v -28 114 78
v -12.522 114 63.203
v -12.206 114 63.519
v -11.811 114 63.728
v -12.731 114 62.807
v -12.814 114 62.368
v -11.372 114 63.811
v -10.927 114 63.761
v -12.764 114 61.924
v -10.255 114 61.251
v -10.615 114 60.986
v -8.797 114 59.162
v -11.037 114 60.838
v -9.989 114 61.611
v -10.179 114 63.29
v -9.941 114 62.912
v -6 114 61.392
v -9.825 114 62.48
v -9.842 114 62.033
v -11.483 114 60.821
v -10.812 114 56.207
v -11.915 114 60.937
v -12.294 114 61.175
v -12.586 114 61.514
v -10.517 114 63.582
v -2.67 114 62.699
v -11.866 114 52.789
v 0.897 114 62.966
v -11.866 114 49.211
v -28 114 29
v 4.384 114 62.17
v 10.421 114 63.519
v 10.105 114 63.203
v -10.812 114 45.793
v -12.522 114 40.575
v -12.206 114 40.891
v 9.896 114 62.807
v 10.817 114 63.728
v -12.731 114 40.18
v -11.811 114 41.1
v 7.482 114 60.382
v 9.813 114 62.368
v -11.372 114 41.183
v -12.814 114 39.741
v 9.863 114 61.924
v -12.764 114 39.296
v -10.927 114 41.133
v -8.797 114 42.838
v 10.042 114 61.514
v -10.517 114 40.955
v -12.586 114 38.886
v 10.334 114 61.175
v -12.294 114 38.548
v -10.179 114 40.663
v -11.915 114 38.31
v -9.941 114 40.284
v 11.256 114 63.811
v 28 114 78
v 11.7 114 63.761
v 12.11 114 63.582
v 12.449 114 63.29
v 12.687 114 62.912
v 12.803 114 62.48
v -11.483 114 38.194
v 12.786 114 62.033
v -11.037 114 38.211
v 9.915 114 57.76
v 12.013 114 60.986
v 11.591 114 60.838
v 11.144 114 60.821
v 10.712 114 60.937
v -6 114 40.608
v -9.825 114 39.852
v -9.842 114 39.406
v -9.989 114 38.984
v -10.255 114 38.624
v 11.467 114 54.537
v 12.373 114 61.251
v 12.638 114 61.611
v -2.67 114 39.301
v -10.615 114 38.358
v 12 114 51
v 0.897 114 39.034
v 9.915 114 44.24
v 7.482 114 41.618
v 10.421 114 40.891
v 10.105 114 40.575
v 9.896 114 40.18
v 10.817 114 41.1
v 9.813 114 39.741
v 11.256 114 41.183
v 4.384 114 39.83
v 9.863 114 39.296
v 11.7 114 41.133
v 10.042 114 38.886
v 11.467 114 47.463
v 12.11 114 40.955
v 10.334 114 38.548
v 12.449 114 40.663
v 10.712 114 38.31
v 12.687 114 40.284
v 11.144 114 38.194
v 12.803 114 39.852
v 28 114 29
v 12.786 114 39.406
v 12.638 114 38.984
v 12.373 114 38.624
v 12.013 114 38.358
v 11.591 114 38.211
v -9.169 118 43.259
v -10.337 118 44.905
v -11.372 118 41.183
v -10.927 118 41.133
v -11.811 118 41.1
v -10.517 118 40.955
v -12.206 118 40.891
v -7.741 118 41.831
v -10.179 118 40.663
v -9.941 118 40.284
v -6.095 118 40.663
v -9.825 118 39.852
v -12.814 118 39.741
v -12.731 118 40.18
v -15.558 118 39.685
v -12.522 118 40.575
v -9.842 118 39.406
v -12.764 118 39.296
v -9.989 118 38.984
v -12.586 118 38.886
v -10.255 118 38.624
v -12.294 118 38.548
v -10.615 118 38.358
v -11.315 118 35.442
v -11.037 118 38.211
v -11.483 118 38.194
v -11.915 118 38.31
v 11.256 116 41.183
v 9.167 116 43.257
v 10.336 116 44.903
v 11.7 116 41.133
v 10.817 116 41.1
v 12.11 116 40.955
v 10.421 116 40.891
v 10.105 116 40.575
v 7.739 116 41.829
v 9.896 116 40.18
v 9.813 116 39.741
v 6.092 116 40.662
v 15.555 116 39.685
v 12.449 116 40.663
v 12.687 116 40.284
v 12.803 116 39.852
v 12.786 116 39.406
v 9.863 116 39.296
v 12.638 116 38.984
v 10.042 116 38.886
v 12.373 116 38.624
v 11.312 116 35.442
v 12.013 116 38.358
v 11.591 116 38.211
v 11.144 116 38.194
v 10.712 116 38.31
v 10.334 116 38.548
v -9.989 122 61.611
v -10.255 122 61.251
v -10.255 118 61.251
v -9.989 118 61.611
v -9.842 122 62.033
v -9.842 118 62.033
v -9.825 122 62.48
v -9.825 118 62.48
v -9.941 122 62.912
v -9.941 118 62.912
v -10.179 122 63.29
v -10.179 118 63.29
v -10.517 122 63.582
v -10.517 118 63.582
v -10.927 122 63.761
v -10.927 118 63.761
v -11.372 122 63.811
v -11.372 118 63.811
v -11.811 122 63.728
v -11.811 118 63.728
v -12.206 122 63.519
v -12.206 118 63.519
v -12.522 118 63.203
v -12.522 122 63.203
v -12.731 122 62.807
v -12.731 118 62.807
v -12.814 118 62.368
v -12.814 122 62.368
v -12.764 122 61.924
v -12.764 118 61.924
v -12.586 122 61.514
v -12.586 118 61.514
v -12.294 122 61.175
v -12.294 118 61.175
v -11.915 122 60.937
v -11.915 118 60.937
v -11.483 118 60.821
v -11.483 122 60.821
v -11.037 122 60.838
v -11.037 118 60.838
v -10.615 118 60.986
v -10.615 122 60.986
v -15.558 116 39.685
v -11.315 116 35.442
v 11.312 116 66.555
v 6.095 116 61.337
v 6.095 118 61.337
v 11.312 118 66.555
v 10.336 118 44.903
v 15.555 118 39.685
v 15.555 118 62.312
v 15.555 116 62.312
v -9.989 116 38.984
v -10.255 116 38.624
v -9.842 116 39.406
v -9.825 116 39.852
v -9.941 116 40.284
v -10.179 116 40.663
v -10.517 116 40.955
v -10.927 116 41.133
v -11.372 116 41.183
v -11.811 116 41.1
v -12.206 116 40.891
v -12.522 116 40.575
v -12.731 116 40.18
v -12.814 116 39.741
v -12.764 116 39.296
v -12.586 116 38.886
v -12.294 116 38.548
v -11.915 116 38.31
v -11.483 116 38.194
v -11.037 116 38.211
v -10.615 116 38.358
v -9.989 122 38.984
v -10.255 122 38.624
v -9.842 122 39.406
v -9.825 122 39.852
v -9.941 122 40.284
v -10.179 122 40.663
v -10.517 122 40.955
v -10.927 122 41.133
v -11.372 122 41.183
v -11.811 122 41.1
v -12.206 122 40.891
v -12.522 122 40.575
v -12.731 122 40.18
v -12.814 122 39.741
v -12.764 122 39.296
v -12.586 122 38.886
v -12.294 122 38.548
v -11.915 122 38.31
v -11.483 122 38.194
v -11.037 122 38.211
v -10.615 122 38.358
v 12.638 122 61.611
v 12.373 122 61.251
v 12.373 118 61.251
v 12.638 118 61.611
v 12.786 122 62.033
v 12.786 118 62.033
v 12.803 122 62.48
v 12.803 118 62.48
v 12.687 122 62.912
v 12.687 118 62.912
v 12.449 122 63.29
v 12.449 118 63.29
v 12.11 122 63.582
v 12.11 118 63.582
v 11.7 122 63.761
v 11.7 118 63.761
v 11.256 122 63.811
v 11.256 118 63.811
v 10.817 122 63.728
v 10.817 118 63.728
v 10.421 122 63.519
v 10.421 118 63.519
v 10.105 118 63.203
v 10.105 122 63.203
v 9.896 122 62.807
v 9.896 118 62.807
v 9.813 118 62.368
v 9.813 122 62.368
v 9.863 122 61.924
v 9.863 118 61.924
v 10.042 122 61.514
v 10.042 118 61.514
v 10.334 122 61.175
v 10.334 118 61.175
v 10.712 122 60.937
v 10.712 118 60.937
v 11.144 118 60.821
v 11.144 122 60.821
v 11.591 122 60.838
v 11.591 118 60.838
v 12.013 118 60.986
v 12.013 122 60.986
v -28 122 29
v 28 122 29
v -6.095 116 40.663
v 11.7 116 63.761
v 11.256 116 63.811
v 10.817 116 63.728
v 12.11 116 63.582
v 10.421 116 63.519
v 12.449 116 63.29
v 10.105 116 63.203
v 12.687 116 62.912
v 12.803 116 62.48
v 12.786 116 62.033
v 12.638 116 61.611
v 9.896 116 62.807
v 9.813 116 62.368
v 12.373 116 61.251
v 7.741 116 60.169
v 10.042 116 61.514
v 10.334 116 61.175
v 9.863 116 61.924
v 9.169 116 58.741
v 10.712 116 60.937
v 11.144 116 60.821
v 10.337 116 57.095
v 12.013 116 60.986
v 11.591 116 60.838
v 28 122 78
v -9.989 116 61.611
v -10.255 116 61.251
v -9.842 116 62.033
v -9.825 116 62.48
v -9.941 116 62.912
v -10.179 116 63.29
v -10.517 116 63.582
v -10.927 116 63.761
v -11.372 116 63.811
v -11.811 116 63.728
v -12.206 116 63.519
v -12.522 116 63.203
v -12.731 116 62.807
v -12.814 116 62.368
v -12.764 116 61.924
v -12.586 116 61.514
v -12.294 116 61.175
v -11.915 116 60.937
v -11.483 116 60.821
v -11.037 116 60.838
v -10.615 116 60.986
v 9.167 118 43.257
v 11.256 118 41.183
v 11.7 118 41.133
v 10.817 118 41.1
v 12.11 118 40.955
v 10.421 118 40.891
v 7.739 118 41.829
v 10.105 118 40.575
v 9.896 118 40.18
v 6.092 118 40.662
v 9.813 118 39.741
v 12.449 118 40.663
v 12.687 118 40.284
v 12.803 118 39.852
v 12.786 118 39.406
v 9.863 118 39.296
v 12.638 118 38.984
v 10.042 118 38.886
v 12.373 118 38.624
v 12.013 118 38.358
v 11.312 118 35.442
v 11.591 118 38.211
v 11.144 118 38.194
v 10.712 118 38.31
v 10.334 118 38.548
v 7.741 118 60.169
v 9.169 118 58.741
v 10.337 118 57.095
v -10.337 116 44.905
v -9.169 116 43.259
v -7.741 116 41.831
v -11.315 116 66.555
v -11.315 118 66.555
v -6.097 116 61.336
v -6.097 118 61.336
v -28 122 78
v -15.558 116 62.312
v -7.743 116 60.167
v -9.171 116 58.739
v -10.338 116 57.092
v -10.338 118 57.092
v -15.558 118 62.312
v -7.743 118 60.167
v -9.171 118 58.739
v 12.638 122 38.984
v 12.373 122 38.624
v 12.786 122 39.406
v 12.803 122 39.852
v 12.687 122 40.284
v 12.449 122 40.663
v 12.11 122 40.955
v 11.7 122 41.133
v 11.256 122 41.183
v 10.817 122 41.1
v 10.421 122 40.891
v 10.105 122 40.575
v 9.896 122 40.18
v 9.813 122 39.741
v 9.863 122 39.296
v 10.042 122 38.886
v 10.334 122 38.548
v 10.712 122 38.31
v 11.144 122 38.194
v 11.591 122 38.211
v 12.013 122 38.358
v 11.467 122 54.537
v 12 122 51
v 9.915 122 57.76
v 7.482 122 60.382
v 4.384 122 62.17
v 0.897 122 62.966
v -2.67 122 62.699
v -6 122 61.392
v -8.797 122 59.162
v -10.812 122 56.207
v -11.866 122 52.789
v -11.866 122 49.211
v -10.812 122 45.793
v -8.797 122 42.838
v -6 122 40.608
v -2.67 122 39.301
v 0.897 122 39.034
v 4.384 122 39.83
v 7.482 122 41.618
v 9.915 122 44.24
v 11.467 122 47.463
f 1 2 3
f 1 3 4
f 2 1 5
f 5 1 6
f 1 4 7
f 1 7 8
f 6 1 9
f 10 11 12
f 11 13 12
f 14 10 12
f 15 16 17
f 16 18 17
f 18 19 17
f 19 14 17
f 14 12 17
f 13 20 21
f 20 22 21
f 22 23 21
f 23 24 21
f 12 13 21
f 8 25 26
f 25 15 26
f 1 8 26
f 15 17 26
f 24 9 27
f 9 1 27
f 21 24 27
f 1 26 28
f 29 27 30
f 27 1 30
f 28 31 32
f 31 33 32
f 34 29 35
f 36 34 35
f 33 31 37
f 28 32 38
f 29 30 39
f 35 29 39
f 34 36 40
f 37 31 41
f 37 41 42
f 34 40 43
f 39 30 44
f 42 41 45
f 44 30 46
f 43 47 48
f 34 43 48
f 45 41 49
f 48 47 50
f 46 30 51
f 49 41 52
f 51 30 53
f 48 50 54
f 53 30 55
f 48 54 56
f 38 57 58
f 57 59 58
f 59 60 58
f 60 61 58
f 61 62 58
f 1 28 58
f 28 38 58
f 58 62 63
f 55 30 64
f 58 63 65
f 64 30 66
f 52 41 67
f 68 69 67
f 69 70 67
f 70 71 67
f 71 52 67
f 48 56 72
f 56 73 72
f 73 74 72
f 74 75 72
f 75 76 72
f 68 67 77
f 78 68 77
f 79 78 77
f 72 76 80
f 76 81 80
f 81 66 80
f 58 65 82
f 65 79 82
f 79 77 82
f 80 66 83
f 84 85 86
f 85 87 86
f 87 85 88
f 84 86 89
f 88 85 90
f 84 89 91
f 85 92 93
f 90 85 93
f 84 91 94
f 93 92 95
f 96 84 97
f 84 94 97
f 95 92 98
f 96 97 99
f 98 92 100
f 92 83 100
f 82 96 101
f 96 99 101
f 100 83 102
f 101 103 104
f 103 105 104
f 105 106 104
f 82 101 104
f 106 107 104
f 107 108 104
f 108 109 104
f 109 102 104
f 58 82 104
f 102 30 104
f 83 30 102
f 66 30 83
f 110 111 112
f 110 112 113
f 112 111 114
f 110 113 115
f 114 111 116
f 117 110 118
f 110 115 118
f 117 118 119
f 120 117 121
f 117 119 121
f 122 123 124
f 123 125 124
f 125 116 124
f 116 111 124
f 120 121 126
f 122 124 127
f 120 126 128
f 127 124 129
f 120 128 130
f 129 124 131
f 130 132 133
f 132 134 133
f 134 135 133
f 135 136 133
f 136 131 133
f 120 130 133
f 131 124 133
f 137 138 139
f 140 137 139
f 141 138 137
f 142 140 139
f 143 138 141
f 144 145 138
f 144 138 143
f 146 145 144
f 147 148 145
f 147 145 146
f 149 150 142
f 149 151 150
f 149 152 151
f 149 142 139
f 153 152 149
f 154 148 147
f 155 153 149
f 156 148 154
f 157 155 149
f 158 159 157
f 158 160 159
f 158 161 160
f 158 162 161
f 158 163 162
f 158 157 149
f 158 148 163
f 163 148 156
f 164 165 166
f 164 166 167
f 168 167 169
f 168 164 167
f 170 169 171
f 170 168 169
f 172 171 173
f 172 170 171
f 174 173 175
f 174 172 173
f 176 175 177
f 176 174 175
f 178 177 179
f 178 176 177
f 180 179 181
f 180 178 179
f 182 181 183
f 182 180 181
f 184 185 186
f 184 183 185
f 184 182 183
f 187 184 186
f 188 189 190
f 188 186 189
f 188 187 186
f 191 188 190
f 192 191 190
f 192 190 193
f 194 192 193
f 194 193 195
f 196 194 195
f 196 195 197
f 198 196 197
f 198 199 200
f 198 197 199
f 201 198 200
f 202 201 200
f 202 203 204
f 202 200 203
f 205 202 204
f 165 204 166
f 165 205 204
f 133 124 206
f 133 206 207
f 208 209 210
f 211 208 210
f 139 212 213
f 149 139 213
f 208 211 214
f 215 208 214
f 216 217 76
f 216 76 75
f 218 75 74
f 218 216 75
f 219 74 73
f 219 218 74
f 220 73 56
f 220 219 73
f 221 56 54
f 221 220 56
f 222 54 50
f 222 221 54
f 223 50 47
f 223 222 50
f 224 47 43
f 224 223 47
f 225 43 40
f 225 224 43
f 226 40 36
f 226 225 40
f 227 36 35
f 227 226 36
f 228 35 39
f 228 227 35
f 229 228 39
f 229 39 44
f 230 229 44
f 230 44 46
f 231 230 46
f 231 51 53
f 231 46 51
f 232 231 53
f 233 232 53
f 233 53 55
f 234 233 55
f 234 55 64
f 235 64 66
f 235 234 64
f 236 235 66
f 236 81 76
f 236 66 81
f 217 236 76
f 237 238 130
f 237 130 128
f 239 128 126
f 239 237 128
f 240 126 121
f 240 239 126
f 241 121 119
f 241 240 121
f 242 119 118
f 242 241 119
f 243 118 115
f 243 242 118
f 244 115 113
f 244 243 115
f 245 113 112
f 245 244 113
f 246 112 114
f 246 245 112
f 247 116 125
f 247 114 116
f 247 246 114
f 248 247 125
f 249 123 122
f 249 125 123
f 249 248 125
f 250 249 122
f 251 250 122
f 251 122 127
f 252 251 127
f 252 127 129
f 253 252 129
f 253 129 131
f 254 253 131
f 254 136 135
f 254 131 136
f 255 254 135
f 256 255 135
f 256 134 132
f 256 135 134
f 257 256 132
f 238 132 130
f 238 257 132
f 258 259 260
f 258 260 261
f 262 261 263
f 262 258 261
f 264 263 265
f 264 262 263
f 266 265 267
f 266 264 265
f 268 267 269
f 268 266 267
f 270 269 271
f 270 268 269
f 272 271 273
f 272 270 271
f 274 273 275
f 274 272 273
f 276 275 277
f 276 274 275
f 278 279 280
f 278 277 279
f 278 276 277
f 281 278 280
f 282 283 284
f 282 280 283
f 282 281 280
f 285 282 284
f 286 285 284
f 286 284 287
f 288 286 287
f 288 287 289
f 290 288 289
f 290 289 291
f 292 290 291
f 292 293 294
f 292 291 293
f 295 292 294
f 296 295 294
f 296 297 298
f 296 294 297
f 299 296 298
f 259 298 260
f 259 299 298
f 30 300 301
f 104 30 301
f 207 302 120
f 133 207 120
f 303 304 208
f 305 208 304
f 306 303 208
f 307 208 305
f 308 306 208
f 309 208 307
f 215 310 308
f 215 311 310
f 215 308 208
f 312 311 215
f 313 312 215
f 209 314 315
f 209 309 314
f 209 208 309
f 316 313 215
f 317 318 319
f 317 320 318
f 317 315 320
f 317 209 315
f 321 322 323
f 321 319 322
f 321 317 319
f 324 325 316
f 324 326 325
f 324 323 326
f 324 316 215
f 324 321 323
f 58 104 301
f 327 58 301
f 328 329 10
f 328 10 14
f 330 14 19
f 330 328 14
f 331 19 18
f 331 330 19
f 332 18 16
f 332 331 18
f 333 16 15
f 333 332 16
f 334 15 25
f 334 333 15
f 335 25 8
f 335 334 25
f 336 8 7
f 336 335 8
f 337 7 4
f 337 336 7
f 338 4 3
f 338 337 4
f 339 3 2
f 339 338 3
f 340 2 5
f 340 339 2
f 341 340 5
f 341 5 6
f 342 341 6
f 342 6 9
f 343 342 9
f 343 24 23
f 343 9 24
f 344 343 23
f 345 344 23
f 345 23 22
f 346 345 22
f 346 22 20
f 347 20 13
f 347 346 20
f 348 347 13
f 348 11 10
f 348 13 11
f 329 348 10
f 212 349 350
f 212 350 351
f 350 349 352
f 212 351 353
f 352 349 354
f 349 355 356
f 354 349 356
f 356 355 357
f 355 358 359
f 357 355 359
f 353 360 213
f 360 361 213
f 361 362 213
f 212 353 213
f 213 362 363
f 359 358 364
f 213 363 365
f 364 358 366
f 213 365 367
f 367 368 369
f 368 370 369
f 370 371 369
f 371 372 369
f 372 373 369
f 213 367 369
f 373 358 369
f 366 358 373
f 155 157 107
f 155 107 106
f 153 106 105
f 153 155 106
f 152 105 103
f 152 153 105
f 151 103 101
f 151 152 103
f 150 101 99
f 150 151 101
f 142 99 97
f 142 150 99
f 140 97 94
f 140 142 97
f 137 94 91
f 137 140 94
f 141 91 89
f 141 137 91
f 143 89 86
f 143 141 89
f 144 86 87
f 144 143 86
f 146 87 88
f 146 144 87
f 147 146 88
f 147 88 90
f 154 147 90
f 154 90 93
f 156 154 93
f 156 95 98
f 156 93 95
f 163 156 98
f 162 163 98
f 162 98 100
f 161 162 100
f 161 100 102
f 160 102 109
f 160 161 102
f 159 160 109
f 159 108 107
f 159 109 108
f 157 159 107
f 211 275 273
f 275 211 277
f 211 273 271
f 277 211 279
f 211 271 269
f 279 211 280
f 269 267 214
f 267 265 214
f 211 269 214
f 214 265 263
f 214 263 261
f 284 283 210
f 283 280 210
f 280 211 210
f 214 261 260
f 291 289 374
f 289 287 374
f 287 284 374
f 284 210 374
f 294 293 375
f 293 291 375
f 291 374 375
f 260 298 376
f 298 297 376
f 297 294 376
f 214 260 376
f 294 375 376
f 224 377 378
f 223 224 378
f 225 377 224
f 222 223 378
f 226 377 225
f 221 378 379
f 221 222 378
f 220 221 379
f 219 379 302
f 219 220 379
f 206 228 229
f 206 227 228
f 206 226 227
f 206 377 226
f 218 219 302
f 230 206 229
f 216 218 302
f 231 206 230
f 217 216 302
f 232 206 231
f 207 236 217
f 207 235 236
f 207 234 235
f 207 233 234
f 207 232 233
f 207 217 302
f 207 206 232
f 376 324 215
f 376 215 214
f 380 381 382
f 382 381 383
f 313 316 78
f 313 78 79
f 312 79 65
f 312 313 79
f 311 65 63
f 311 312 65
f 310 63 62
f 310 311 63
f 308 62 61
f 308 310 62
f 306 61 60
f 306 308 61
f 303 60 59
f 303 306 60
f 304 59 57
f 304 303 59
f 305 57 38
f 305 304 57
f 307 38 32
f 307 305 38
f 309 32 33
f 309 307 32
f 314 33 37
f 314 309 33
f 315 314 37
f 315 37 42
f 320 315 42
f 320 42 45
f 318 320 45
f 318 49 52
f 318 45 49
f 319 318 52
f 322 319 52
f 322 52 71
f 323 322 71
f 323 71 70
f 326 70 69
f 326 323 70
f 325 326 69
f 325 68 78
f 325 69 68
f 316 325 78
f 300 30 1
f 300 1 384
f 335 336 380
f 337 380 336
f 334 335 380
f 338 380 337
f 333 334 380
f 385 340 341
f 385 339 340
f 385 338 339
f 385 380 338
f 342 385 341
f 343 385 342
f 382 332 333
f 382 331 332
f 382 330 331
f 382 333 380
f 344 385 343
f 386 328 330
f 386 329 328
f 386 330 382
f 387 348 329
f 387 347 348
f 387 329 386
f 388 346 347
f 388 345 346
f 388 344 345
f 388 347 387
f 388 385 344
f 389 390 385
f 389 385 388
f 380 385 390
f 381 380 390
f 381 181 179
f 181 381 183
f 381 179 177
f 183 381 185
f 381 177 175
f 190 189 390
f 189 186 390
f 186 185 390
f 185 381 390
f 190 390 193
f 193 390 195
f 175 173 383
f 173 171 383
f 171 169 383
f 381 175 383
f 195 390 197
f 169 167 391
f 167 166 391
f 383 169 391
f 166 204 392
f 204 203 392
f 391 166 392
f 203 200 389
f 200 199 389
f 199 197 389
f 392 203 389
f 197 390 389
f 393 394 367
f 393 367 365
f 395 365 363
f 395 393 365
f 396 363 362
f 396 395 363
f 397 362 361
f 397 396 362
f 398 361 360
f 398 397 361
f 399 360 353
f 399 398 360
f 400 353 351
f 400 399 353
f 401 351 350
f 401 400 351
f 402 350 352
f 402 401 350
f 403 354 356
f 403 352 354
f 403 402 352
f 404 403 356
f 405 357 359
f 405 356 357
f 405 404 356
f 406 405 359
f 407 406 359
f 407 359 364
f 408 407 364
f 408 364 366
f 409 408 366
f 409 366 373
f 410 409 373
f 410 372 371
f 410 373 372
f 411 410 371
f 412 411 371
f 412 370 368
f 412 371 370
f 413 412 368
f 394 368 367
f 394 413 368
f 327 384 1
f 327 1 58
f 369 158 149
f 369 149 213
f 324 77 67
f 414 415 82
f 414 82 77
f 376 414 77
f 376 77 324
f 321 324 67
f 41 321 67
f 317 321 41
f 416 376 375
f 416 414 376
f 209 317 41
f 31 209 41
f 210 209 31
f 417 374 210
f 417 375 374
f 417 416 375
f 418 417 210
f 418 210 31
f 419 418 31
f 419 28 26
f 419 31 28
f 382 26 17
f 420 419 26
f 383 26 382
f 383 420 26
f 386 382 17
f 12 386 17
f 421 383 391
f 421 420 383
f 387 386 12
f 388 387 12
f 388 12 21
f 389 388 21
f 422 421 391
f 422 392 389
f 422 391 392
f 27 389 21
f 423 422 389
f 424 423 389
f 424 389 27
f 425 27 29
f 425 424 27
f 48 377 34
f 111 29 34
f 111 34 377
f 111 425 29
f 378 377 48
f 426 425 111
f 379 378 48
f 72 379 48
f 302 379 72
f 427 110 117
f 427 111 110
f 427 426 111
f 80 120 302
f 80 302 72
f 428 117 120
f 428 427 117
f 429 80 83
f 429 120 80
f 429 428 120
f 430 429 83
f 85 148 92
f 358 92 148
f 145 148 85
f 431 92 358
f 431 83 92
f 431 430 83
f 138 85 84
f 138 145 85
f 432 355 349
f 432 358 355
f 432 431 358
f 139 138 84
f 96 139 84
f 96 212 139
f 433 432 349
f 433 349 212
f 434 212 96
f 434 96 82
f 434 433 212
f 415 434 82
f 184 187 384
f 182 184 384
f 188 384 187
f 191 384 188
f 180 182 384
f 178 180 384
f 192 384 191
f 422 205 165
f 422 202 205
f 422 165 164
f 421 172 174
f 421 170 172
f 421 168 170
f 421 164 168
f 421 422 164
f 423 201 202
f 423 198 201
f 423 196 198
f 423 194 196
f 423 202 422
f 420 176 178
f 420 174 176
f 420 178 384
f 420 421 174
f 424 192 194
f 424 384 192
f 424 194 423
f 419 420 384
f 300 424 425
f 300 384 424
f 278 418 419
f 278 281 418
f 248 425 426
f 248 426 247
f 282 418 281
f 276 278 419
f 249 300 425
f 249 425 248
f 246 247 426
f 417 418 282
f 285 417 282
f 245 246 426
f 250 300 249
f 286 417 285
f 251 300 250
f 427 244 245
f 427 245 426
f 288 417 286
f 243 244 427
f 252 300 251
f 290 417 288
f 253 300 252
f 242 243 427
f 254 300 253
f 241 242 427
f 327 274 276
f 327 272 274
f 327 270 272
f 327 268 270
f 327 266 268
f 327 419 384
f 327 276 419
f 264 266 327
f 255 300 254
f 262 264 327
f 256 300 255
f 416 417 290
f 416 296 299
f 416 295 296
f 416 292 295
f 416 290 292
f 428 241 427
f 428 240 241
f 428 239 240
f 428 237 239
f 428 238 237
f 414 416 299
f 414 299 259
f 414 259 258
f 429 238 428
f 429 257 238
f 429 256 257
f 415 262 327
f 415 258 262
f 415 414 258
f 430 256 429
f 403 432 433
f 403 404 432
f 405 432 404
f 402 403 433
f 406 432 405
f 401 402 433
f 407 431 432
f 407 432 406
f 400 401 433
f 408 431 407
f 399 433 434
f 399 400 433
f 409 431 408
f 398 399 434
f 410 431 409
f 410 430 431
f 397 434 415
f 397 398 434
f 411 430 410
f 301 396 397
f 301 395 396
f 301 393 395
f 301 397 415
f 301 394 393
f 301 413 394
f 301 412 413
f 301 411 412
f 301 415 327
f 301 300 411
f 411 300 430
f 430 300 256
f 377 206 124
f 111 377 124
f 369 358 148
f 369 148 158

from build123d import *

# Parameters (mm, degrees)
BOX786_W                    = 6
BOX786_H                    = 2
BOX786_DEPTH                = 8
BOX780_W                    = 8
BOX780_H                    = 2
BOX780_DEPTH                = 6
BOX783_W                    = 8
BOX783_H                    = 2
BOX783_DEPTH                = 6
BOX785_W                    = 6
BOX785_H                    = 2
BOX785_DEPTH                = 8
COMPOUND939_PLACEMENT_ANGLE = 45
CYLINDER1872_R              = 12
CYLINDER1872_DEPTH          = 20
CYLINDER1874_R              = 1.5
CYLINDER1874_DEPTH          = 40
CYLINDER1876_R              = 1.5
CYLINDER1876_DEPTH          = 40
CYLINDER1875_R              = 1.5
CYLINDER1875_DEPTH          = 40
CYLINDER1873_R              = 1.5
CYLINDER1873_DEPTH          = 40
COMPOUND942_PLACEMENT_ANGLE = 45
BOX782_W                    = 56
BOX782_H                    = 8
BOX782_DEPTH                = 49


with BuildPart() as krychle786:
    # Box786 → Box786 (new body)
    with BuildSketch(Plane(origin=(-3, 116, 30), x_dir=(1, 0, 0), z_dir=(0, 0, 1))):
        with Locations((3, 1)):
            Rectangle(BOX786_W, BOX786_H)
    extrude(amount=BOX786_DEPTH)


with BuildPart() as krychle780:
    # Box780 → Box780 (new body)
    with BuildSketch(Plane(origin=(-19, 116, 46), x_dir=(1, 0, 0), z_dir=(0, 0, 1))):
        with Locations((4, 1)):
            Rectangle(BOX780_W, BOX780_H)
    extrude(amount=BOX780_DEPTH)


with BuildPart() as krychle783:
    # Box783 → Box783 (new body)
    with BuildSketch(Plane(origin=(11, 116, 46), x_dir=(1, 0, 0), z_dir=(0, 0, 1))):
        with Locations((4, 1)):
            Rectangle(BOX783_W, BOX783_H)
    extrude(amount=BOX783_DEPTH)


with BuildPart() as compound939:
    # Box785 → Box785 (new body)
    with BuildSketch(Plane(origin=(-3, 116, 60), x_dir=(1, 0, 0), z_dir=(0, 0, 1))):
        with Locations((3, 1)):
            Rectangle(BOX785_W, BOX785_H)
    extrude(amount=BOX785_DEPTH)

    # Compound939: union Krychle786, Krychle780, Krychle783
    add(krychle786.part)
    add(krychle780.part)
    add(krychle783.part)


with BuildPart() as compound939_1:
    # Compound939 placement: moved
    add(compound939.part.moved(Location((-34.65, 0, 16.35))).rotate(Axis((-34.65, 0, 16.35), (0, 1, 0)), COMPOUND939_PLACEMENT_ANGLE))


with BuildPart() as v_lec1872:
    # Cylinder1872 → Cylinder1872 (new body)
    with BuildSketch(Plane(origin=(0, 124, 51), x_dir=(1, 0, 0), z_dir=(0, -1, 0))):
        Circle(CYLINDER1872_R)
    extrude(amount=CYLINDER1872_DEPTH)


with BuildPart() as v_lec1874:
    # Cylinder1874 → Cylinder1874 (new body)
    with BuildSketch(Plane(origin=(16, 140, 49), x_dir=(1, 0, 0), z_dir=(0, -1, 0))):
        Circle(CYLINDER1874_R)
    extrude(amount=CYLINDER1874_DEPTH)


with BuildPart() as v_lec1876:
    # Cylinder1876 → Cylinder1876 (new body)
    with BuildSketch(Plane(origin=(-16, 140, 49), x_dir=(1, 0, 0), z_dir=(0, -1, 0))):
        Circle(CYLINDER1876_R)
    extrude(amount=CYLINDER1876_DEPTH)


with BuildPart() as v_lec1875:
    # Cylinder1875 → Cylinder1875 (new body)
    with BuildSketch(Plane(origin=(0, 140, 33), x_dir=(1, 0, 0), z_dir=(0, -1, 0))):
        Circle(CYLINDER1875_R)
    extrude(amount=CYLINDER1875_DEPTH)


with BuildPart() as compound942:
    # Cylinder1873 → Cylinder1873 (new body)
    with BuildSketch(Plane(origin=(0, 140, 65), x_dir=(1, 0, 0), z_dir=(0, -1, 0))):
        Circle(CYLINDER1873_R)
    extrude(amount=CYLINDER1873_DEPTH)

    # Compound942: union Válec1874, Válec1876, Válec1875
    add(v_lec1874.part)
    add(v_lec1876.part)
    add(v_lec1875.part)


with BuildPart() as compound942_1:
    # Compound942 placement: moved
    add(compound942.part.moved(Location((-34.65, 0, 16.35))).rotate(Axis((-34.65, 0, 16.35), (0, 1, 0)), COMPOUND942_PLACEMENT_ANGLE))


with BuildPart() as cut588:
    # Box782 → Box782 (new body)
    with BuildSketch(Plane(origin=(-28, 114, 29), x_dir=(1, 0, 0), z_dir=(0, 0, 1))):
        with Locations((28, 4)):
            Rectangle(BOX782_W, BOX782_H)
    extrude(amount=BOX782_DEPTH)

    # Cut584: cut Compound942
    add(compound942_1.part, mode=Mode.SUBTRACT)

    # Cut590: cut Válec1872
    add(v_lec1872.part, mode=Mode.SUBTRACT)

    # Cut588: cut Compound939
    add(compound939_1.part, mode=Mode.SUBTRACT)


solid = cut588.part
